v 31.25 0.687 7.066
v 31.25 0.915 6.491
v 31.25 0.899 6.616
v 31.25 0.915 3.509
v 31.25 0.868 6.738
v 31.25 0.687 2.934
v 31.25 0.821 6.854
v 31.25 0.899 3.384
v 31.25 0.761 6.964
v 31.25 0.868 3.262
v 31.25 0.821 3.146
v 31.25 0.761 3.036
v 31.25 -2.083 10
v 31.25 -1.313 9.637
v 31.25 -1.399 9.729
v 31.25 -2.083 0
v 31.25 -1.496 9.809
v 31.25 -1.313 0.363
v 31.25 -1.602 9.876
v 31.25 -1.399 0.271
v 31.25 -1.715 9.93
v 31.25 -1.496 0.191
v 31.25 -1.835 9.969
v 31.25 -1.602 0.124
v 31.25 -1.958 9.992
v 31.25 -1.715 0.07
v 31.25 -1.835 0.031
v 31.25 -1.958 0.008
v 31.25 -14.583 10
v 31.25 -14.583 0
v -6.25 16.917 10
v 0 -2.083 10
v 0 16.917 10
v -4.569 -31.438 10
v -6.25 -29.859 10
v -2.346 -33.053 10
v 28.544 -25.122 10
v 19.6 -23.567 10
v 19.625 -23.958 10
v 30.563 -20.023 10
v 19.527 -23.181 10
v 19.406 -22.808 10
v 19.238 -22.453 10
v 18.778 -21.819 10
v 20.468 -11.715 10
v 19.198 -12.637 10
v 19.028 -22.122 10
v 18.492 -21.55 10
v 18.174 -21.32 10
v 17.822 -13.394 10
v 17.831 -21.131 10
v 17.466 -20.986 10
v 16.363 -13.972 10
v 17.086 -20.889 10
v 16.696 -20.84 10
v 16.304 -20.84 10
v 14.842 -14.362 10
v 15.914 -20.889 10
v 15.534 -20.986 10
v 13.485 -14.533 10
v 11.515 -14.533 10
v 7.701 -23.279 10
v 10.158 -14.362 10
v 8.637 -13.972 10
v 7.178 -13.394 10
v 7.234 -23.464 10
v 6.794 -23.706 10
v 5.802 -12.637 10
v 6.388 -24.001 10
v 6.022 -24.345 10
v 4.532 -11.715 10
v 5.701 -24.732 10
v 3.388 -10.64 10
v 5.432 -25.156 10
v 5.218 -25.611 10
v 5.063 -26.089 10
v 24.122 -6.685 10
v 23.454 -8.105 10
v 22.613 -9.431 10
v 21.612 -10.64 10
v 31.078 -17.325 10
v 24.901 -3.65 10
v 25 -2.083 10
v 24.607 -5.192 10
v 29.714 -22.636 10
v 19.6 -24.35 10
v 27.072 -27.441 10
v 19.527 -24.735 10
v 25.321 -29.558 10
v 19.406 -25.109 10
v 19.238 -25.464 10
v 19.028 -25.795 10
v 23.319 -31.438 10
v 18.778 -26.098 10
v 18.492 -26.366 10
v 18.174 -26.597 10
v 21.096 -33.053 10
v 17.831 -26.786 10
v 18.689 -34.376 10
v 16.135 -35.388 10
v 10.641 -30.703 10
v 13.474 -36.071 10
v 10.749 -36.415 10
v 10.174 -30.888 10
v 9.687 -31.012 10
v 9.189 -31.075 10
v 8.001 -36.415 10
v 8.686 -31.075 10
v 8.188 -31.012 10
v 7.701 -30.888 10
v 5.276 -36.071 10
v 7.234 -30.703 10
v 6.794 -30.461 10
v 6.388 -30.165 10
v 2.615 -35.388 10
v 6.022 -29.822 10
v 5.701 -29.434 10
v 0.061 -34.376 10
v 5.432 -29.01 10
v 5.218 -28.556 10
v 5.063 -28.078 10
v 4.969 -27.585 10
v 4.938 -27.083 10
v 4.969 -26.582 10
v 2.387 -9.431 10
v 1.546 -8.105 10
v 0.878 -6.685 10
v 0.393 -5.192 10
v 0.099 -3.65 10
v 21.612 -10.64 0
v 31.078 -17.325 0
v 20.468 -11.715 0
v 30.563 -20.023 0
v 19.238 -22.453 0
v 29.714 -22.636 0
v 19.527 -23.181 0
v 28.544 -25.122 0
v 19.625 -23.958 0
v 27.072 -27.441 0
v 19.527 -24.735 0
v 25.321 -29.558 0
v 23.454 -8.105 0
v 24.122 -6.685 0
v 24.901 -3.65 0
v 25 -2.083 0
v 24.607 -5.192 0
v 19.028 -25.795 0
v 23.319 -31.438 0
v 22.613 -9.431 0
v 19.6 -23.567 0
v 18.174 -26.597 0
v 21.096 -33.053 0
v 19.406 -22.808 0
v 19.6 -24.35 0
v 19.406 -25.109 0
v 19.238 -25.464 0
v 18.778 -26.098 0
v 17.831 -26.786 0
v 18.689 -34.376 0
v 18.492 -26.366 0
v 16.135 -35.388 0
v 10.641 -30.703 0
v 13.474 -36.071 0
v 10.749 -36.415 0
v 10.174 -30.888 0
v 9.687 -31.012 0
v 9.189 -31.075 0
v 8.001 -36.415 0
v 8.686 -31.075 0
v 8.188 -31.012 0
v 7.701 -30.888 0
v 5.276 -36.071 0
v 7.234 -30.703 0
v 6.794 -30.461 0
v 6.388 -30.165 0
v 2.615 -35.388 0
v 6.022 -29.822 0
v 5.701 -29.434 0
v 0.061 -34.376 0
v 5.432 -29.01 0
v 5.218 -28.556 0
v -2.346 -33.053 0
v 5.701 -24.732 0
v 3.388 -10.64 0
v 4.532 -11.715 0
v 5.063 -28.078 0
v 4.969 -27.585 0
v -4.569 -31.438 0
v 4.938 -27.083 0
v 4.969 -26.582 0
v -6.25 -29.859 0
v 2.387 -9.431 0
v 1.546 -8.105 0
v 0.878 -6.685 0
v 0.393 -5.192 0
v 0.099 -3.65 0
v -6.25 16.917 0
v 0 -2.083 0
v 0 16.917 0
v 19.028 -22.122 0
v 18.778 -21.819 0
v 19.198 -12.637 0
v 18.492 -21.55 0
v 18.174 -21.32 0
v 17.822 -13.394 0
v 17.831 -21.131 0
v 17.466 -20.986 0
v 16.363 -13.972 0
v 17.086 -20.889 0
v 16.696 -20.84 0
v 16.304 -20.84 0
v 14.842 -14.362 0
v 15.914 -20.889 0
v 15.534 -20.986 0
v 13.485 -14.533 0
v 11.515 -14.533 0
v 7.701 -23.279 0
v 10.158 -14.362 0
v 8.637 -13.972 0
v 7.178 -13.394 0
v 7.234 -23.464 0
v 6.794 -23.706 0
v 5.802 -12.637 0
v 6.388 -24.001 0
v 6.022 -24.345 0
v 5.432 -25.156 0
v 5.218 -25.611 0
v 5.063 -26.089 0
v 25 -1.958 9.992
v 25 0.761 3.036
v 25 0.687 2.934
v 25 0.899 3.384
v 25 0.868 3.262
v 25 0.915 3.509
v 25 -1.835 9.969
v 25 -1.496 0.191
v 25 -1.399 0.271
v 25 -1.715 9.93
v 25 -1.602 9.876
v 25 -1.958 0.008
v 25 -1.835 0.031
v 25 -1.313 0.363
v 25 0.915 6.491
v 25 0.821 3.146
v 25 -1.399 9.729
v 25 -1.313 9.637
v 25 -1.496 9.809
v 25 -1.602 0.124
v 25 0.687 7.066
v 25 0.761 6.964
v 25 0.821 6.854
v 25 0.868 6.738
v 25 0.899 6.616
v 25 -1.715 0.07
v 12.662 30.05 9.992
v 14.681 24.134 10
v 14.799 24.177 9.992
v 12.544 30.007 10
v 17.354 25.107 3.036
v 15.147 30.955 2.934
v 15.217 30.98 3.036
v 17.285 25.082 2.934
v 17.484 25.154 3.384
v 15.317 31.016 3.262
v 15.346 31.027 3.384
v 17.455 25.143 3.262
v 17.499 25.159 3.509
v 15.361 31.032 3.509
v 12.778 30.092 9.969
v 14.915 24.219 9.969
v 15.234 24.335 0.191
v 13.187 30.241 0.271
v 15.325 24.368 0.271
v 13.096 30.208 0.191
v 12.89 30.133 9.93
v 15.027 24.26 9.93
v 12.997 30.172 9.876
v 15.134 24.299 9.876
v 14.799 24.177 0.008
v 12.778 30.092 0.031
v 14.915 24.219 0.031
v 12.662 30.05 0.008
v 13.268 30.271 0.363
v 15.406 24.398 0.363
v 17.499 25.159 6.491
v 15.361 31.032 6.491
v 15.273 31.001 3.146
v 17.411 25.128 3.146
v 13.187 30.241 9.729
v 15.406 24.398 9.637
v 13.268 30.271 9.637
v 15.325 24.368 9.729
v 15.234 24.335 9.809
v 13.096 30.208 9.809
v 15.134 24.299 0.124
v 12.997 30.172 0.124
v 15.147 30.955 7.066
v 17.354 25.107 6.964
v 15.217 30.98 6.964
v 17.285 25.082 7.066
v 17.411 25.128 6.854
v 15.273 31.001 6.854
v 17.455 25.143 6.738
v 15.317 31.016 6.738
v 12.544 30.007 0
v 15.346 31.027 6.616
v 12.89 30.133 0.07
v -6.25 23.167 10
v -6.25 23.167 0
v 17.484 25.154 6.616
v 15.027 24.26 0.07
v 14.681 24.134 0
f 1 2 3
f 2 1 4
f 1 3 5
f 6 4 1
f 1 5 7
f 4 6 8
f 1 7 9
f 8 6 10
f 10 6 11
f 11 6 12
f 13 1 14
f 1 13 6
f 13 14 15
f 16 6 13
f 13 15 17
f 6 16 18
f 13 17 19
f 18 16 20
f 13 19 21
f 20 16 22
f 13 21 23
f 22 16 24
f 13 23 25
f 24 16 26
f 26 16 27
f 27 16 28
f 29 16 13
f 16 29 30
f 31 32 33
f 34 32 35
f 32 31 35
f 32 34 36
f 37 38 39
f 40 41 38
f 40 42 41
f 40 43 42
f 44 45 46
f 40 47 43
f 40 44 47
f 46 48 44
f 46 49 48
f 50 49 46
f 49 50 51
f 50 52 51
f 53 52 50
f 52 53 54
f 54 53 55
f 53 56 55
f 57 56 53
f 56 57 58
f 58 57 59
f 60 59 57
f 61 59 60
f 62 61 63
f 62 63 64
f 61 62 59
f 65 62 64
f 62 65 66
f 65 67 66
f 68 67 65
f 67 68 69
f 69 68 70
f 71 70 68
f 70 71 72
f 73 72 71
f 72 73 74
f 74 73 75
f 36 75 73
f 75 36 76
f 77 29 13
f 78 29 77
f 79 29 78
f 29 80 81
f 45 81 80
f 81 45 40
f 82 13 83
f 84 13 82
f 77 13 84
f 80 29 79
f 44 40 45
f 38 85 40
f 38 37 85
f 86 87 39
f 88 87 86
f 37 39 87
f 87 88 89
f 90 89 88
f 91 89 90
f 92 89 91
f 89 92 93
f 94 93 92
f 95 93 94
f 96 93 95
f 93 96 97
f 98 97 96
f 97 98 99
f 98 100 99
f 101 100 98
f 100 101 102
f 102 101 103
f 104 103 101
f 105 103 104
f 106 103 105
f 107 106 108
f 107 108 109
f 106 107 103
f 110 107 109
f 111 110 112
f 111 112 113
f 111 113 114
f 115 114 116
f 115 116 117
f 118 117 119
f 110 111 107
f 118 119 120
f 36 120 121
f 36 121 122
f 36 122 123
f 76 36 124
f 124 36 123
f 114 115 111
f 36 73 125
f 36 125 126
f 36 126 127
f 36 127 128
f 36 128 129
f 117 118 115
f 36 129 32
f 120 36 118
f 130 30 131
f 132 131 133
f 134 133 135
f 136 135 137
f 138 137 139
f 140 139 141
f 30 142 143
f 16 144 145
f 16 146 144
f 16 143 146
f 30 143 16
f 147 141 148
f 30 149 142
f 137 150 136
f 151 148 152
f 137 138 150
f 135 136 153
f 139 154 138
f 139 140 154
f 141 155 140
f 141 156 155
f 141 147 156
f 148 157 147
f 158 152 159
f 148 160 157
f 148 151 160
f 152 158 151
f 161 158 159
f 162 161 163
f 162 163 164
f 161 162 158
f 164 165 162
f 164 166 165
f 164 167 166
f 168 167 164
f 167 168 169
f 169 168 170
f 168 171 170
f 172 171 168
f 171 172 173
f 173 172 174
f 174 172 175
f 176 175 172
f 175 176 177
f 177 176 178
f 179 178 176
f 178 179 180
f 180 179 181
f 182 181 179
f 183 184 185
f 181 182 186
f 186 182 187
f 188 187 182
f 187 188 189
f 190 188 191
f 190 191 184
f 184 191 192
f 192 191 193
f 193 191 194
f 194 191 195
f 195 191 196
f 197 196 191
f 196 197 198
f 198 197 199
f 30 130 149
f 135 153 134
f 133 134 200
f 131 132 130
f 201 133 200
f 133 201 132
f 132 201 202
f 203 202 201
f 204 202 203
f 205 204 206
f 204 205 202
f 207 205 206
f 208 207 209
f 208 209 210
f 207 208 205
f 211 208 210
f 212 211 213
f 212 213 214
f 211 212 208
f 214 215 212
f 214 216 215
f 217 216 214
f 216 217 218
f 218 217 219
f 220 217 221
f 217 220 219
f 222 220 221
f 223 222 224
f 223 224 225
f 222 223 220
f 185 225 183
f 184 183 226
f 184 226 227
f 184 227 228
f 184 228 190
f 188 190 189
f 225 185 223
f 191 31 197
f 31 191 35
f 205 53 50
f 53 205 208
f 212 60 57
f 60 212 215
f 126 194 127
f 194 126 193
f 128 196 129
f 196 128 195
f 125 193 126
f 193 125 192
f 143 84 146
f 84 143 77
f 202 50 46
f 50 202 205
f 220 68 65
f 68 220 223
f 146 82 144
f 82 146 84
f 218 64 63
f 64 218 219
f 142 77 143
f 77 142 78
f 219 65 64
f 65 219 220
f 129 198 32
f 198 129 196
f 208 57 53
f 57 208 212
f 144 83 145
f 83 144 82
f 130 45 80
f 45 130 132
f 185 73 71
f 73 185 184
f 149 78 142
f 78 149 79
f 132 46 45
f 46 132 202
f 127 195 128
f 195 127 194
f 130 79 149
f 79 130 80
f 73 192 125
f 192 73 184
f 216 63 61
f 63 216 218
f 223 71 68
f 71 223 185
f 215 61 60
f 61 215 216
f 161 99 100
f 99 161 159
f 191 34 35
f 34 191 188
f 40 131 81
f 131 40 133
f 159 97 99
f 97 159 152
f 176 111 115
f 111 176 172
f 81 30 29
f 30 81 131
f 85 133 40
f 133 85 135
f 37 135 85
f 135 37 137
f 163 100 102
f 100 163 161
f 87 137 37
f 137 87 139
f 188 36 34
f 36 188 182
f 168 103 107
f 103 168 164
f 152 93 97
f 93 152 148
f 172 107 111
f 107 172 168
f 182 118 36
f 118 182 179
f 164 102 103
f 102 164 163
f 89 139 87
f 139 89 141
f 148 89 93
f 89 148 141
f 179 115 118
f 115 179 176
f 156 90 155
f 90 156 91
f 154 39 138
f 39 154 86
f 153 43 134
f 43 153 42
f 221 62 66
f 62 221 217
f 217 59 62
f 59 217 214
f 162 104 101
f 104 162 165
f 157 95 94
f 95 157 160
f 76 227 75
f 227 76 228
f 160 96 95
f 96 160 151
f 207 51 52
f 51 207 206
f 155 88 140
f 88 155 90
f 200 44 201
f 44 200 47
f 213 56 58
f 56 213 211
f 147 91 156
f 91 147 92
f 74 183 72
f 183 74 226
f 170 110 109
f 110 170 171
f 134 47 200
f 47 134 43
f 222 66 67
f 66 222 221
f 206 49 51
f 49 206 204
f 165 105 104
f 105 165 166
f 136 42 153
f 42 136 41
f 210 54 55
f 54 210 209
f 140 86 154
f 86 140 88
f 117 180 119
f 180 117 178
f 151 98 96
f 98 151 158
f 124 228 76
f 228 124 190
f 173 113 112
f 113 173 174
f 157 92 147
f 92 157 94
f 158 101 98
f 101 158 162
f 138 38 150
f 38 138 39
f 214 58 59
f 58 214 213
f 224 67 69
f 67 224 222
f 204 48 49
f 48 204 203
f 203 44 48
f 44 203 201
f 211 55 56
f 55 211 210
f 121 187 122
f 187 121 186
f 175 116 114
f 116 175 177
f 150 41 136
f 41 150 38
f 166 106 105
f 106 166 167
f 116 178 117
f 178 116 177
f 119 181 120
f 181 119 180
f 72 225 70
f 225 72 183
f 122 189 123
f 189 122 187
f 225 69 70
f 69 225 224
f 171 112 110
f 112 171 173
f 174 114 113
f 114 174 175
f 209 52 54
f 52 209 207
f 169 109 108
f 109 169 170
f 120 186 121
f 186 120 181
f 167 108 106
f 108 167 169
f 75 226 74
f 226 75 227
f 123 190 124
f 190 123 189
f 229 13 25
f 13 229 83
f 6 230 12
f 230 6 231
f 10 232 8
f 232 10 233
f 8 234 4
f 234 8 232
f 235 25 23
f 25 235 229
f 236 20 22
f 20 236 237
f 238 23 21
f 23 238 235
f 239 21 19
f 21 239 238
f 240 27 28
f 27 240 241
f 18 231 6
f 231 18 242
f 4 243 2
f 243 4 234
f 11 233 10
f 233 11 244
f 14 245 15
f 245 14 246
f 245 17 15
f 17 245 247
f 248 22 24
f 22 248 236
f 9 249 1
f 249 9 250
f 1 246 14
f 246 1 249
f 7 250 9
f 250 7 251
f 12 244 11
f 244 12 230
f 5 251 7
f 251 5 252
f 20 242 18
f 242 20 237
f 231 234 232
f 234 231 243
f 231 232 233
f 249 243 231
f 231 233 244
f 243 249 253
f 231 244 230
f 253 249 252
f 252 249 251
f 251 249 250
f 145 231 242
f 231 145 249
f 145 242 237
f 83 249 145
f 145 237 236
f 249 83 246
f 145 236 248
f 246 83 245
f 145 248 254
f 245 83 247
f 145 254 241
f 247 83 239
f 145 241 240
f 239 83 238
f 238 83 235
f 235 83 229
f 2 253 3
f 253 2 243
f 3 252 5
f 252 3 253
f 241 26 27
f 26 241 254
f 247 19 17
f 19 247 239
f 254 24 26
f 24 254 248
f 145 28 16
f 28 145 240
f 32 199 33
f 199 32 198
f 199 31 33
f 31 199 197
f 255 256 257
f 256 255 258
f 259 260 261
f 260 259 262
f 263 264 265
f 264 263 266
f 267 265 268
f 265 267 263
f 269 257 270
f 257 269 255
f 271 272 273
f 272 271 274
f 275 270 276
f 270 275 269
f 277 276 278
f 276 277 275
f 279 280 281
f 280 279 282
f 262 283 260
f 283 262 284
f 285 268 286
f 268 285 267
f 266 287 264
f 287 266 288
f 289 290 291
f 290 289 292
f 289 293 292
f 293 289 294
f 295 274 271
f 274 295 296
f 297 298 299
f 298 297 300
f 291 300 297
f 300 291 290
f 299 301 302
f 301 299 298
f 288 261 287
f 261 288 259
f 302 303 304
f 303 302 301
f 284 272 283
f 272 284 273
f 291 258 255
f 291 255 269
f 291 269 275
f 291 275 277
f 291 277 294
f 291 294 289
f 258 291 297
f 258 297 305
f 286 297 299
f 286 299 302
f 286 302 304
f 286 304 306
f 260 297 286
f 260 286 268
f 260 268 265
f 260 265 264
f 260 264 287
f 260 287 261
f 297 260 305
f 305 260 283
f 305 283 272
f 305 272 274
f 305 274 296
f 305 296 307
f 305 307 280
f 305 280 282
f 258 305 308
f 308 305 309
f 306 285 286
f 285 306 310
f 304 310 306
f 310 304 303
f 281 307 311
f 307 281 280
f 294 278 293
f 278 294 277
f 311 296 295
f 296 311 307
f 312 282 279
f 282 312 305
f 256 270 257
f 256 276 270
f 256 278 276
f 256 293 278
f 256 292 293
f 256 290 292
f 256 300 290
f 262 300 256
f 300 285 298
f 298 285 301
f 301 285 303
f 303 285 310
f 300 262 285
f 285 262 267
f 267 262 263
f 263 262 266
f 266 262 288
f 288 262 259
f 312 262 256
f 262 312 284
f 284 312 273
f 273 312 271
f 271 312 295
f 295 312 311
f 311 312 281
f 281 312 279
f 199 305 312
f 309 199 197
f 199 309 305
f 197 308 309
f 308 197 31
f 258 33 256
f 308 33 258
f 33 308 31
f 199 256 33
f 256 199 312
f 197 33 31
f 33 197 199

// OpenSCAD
/*----------------------------------------------------------------------------*/
/*-------                         INFORMATIONS                        --------*/
/*----------------------------------------------------------------------------*/
/*----------------------------------------------------------------------------*/

// CUSTOMIZABLE U-HOOK (parametric and very strong hook)
// by Serge Payen, January 2016
// www.sergepayen.fr/en/parametric-u-hook
// "customizable_u_hook" is licenced under Creative Commons :
// Attribution-NonCommercial-ShareAlike 4.0 International (CC BY-NC-SA 4.0)
// http://creativecommons.org/licenses/by-nc-sa/4.0/

// HOW TO USE THIS FILE :

// -- Solution 1 :
// Open this file with OpenScad software (free and open-source)
// http://www.openscad.org/downloads.html
// Choose your parameters in the SETTINGS chapter (see below)
// Press F5 to compile and see the resulting hook
// Check your hook's global size in the console window (below viewing area)
// If OK, press F6 to render
// Go to : File => Export => Export as STL : choose filename and location
// Save the STL file of your customized hook
// Send this STL file to your 3D printer

// -- Solution 2 :
// This file had been optimized for Thingiverse Customizer
// You will need to have a Thingiverse Account, then :
// Go to object's page on Thingiverse
// Click on the button "Open in Customizer"
// Choose your settings in parameters tabs
// Save the STL file of your customized hook
// Send this STL file to your 3D printer



/*----------------------------------------------------------------------------*/
/*-------                           SETTINGS                          --------*/
/*----------------------------------------------------------------------------*/

/* [HOOK SHAPE] */

// Choose between classic hook with screw-holes (0) or "bracket" system (1)
bracket=0; // [0, 1]

// Choose between square (0) and round bracket (1)
bracket_round=0; // [0, 1]

// Choose to have a second hook (1) or not (0)
second_hook=1; // [0, 1]



/* [MAIN HOOK SIZE] */

// Intern diameter of hook's main U shape
hook_size=25; // [0.1:250]

// Hook's "thickness" = object's width = print's height
thickness=10; // [0.1:250]



/* [SECOND HOOK] */

// Lenght of second hook. Good values are around "Hook Size" x 0.75
second_hook_lenght=20; // [0.1:200]

// Angle of second hook. Best is between 45° and 65°.
second_hook_angle=70; // [0:90]



/* [SPACERS] */

// Space between main hook and bottom screw
spacer_1=0; // [0:200]

// Space between bottom screw and secondary hook
spacer_2=10; // [0:200]

// Space between second hook and top screw
spacer_3=0; // [0:200]

// Space between top screw and hook's rounded top
spacer_4=0; // [0:200]



/* [SCREW-HOLES] */

// Diameter of the screw you plan to use
screw_diam=3; // [0:0.5:20]

// Diameter of screw-head
screw_head=8; // [0:0.5:40]

// Screw-head height (deepness for screw-head hole)
screw_head_h=3; // [0:0.5:20]

// Tolerance, for screw easy-fitting
tolerance=0.5; // [0:0.1:10]



/* [BRACKET] */

// Bracket's main size
bracket_size=40; // [0:250]

// Bracket's back lenght
stop_lenght=15; // [0:250]

// Bracket Stiffness (only with square bracket)
bracket_stiffness=2.5; // [0:100]



/* [EXTRA SETTINGS] */

// Choose to have a screw-hole in square bracket (1), or not (0)
safety_screw=0; // [1, 0]

// Choose to have the hook's "triangle" extremity (1) or not (0)
extremity=1; // [1, 0]

// Choose to have screw-holes (1) or not (0)
screw_holes=0; // [1, 0]

// Choose to have the hook's rounded "top" (1) or not (0)
rounded_top=1; // [1, 0]



/*------------------------------------------------------------------------------

NOTE about GENERAL DIMENSIONS AND CUSTOM HEIGHTS SETTINGS :

To respect general shape's efficiency, global size is relative to "hook_size".
Change "hook_size" for a bigger or smaller hook, then choose more options.
Different values for "spacer_1,2,3,4" will change size on Y-axis.

When compiling, OpenScad will return the total dimensions in the console window.
Keep in mind the hook is printed "laying on his side" on print bed.
In the first few lines of console window (below viewing area), you can read :
ECHO : TOTAL_SIZE_ON_X_AXIS = x (total width : adjust "hook_size" and/or bracket)
ECHO : TOTAL_SIZE_ON_Y_AXIS = y (total lenght : adjust with "spacer_1/2/3/4")
ECHO : TOTAL_SIZE_ON_Z_AXIS = z (total height : adjust "thickness")
It will also return informations about all other strategic sizes.
Console will also display warning messages if some values are illogic.

------------------------------------------------------------------------------*/



/*----------------------------------------------------------------------------*/
/*-------                             CODE                            --------*/
/*----------------------------------------------------------------------------*/

/*____________________________________________________________________________*/
/* [HIDDEN] */
// shortcuts
stiffness=hook_size/4;
big_r=hook_size/5*0.8;
small_r=stiffness/2;
height_bottom=hook_size;
width_global=hook_size+stiffness*2;
half_width=width_global/2-stiffness/2;
screw_hole=screw_diam+tolerance*2;
screw_house=screw_head+tolerance*2;
bracket_move=bracket_size/2+width_global/2;
bracket_round_diam=bracket_size+stiffness*2;
min_height1=spacer_1+screw_house/2+stiffness;
min_height2=min_height1+spacer_2/2+screw_house/2;
min_height2_hg=spacer_1+stiffness+spacer_2/2;
min_height3=min_height2+spacer_3/2+spacer_2/2;
min_height3_hg=min_height2_hg+spacer_3/2+spacer_2/2;
min_height4=min_height3+spacer_4/2+spacer_3/2+screw_house;
min_height4_hg=min_height3_hg+spacer_3/2+spacer_4/2;
space_global=spacer_1+spacer_2+spacer_3+spacer_4;
$fn=50;

// remove specific colors for each module
color ("Gold")
translate ([hook_size/2,-hook_size/3,thickness/2])
rotate ([0,0,0])
uhook ();

echo (TOTAL_SIZE_ON_Z_AXIS=thickness);
echo (MAIN_HOOK_INTERN_DIAMETER=hook_size);

if (bracket)
{
    echo (BRACKET_SIZE=bracket_size);
    echo (BRACKET_STIFFNESS=bracket_stiffness);
    echo (STOP_LENGHT=stop_lenght);
}
else
{
    echo (SCREW_HOLES_DIAMETER=screw_diam);
    echo (SCREW_HEAD_DIAMETER=screw_head);
    echo (SCREW_HEAD_HEIGHT=screw_head_h);
}

if ((bracket)&&(safety_screw))
{
    echo (SAFETY_SCREW_DIAMETER=screw_diam);
    echo (SAFETY_SCREW_HEAD_DIAMETER=screw_head);
    echo (SAFETY_SCREW_HEAD_HEIGHT=screw_head_h);
}

if (second_hook)
{
    echo (SECOND_HOOK_LENGHT=second_hook_lenght);
    echo (SECOND_HOOK_ANGLE=second_hook_angle);
}






/*____________________________________________________________________________*/
// final union of all modules
module uhook ()
{
    union ()
    {

        // hook's base, this part don't depend on hook's type
        belly ();

        translate ([0,-height_bottom/2-stiffness,0])
        bottom ();

        translate ([half_width,stiffness,0])
        rotate ([0,90,0])
        tip ();



        // conditionnal part, depending on hook's type
        if (bracket)
        {
            translate ([-half_width,stiffness+spacer_1/2,0])
            addH1 ();
            translate ([-half_width,min_height2_hg,0])
            addH2 ();
        }
        else
        {
            translate ([-half_width,stiffness+spacer_1/2,0])
            addH1 ();
            translate ([-half_width,min_height1,0])
            screw ();
            translate ([-half_width,min_height2,0])
            addH2 ();
        }

        if ((bracket)&&(second_hook))
        {
            translate ([-width_global/2,min_height2_hg+spacer_2/2,-thickness/2])
            arm ();
            translate ([-half_width,min_height3_hg+hook_size,0])
            addH3 ();
            translate ([-half_width,min_height4_hg+hook_size,0])
            addH4 ();
            if (bracket_round)
            {
            translate ([-width_global/2-bracket_round_diam/2+stiffness,min_height4_hg+hook_size+spacer_4/2,0])
            sHook ();
            //width calculation
            width_total=width_global-stiffness+bracket_round_diam;
            echo (TOTAL_SIZE_ON_X_AXIS=width_total);
            //height calculation
            height_global=hook_size*2+stiffness*2+space_global+bracket_round_diam/2;
            echo (TOTAL_SIZE_ON_Y_AXIS=height_global);
            }
            else
            {
                translate ([-half_width,min_height4_hg+hook_size+spacer_4/2+stiffness/2,0])
                head ();
                translate ([-bracket_move,min_height4_hg+hook_size+spacer_4/2+stiffness-bracket_stiffness/2,0])
                hang ();
                //width calculation
                width_total=width_global+bracket_size+bracket_stiffness;
                echo (TOTAL_SIZE_ON_X_AXIS=width_total);
                //height calculation
                height_global=hook_size*2+stiffness*3+space_global;
                echo (TOTAL_SIZE_ON_Y_AXIS=height_global);
            }

        }

        else if (second_hook)
        {
            translate ([-width_global/2,min_height2+spacer_2/2,-thickness/2])
            arm ();
            // translate ([-half_width,min_height3+hook_size,0])
            // addH3 ();
            // translate ([-half_width,min_height3+hook_size+spacer_3/2+screw_house/2,0])
            // screw ();
            // translate ([-half_width,min_height4+hook_size,0])
            // addH4 ();
            // translate ([-half_width,min_height4+hook_size+spacer_4/2+stiffness/2,0])
            // head ();
            //height calculation
            height_global=hook_size*2+stiffness*3+screw_house*2+space_global;
            echo (TOTAL_SIZE_ON_Y_AXIS=height_global);
        }
        else if (bracket)
        {
            translate ([-half_width,min_height3_hg,0])
            addH3 ();
            translate ([-half_width,min_height4_hg,0])
            addH4 ();
            if (bracket_round)
            {
                translate ([-width_global/2-bracket_round_diam/2+stiffness,min_height4_hg+spacer_4/2,0])
                sHook ();
                //width calculation
                width_total=width_global-stiffness+bracket_round_diam;
                echo (TOTAL_SIZE_ON_X_AXIS=width_total);
                //height calculation
                height_global=hook_size+stiffness*2+space_global+bracket_round_diam/2;
                echo (TOTAL_SIZE_ON_Y_AXIS=height_global);
            }
            else
            {
                translate ([-half_width,min_height4_hg+spacer_4/2+stiffness/2,0])
                head ();
                translate ([-bracket_move,min_height4_hg+spacer_4/2+stiffness-bracket_stiffness/2,0])
                hang ();
                //width calculation
                width_total=width_global+bracket_size+bracket_stiffness;
                echo (TOTAL_SIZE_ON_X_AXIS=width_total);
                //height calculation
                height_global=hook_size+stiffness*3+space_global;
                echo (TOTAL_SIZE_ON_Y_AXIS=height_global);
            }

        }
        else
        {
            translate ([-half_width,min_height3,0])
            addH3 ();
            translate ([-half_width,min_height3+spacer_3/2+screw_house/2,0])
            screw ();
            translate ([-half_width,min_height4,0])
            addH4 ();
            translate ([-half_width,min_height4+spacer_4/2+stiffness/2,0])
            head ();
            //height calculation
            height_global=hook_size+stiffness*3+screw_house*2+space_global;
            echo (TOTAL_SIZE_ON_Y_AXIS=height_global);
        }

    }

}



/*____________________________________________________________________________*/
// hook's bottom shape, with a hole inside
module bottom ()
{
    color ("Gold")
    difference ()
    {
        // bottom
        intersection ()
        {
            cube ([width_global,height_bottom+0.1,thickness], center=true);

            translate ([-0.5*stiffness,height_bottom/2,0])
            cylinder(r=hook_size/2+stiffness*1.5, h=thickness+0.1, center=true);

        }

        // hole
        hull ()
        {
            translate ([-big_r/2-stiffness/4,0,0])
            cylinder (r=big_r, h=thickness+0.2, center=true);

            translate ([big_r,stiffness/2,0])
            cylinder (r=small_r, h=thickness+0.2, center=true);

        }

    }

}


/*____________________________________________________________________________*/
// main hook's U-shape
module belly ()
{
    color ("Crimson")
    difference ()
    {
        // base cube
        cube ([width_global,hook_size/2,thickness], center=true);

        // half-cylindric hole
        translate ([0,hook_size/4,0])
        cylinder (r=hook_size/2, h=thickness+0.1, center=true);

    }
}


/*____________________________________________________________________________*/
// screw-hole module
module screw ()
{
    if (thickness>screw_house*8)
    {
        color ("Silver")
        difference ()
        {
            //base cube
            cube ([stiffness,screw_house,thickness], center=true);

            if (screw_holes)
            {
                // screw1 hole
                translate ([0,0,thickness/4])
                rotate ([0,90,0])
                cylinder (d=screw_hole, h=stiffness+0.1, center=true);

                // screw1-head hole 1
                translate ([stiffness/2-screw_head_h/2+0.1,0,thickness/4])
                rotate ([0,90,0])
                cylinder (d=screw_house, h=screw_head_h, center=true);

                // screw2 hole
                translate ([0,0,-thickness/4])
                rotate ([0,90,0])
                cylinder (d=screw_hole, h=stiffness+0.1, center=true);

                // screw2-head hole 1
                translate ([stiffness/2-screw_head_h/2+0.1,0,-thickness/4])
                rotate ([0,90,0])
                cylinder (d=screw_house, h=screw_head_h, center=true);
            }
        }

    }
    else
    {
        color ("Silver")
        difference ()
        {
            //base cube
            cube ([stiffness,screw_house,thickness], center=true);

            if (screw_holes)
            {
                // screw hole
                rotate ([0,90,0])
                cylinder (d=screw_hole, h=stiffness+0.1, center=true);

                // screw-head hole
                translate ([stiffness/2-screw_head_h/2+0.1,0,0])
                rotate ([0,90,0])
                cylinder (d=screw_house, h=screw_head_h, center=true);
            }

        }
    }

}


/*____________________________________________________________________________*/
// hook's triangle extremity
module tip ()
{
    if (extremity)
    color ("Gold")
    difference ()
    {
        hull ()
        {
            translate ([thickness/2-thickness/10,0,0])
            cylinder (d=thickness/5, h=stiffness, center=true);
            translate ([-thickness/2+thickness/10,0,0])
            cylinder (d=thickness/5, h=stiffness, center=true);

            translate ([thickness/7,thickness/5,0])
            cylinder (d=thickness/5, h=stiffness, center=true);
            translate ([-thickness/7,thickness/5,0])
            cylinder (d=thickness/5, h=stiffness, center=true);
        }

        translate ([0,-thickness/4,0])
        cube ([thickness+0.1, thickness/2, thickness], center=true);

    }
    else
    {
        hull ()
        {
            translate ([thickness/2-thickness/10,0,0])
            cylinder (d=thickness/5, h=stiffness, center=true);
            translate ([-thickness/2+thickness/10,0,0])
            cylinder (d=thickness/5, h=stiffness, center=true);
        }
    }

}


/*____________________________________________________________________________*/
// secondary hook
module arm ()
{
    color ("Orange")
    union ()
    {
        // cube ([stiffness, hook_size, thickness]);

        translate ([0,stiffness,0])
        union ()
        {
            rotate ([0,0,-second_hook_angle])
            union ()
            {
                hull ()
                {
                    cube ([stiffness, second_hook_lenght, thickness]);
                    rotate ([0,0,second_hook_angle])
                    translate ([0,-stiffness,0])
                    cube ([stiffness, stiffness, thickness]);
                }

                rotate ([0,90,0])
                translate ([-thickness/2,second_hook_lenght,stiffness/2])
                tip ();
            }
        }
    }

}


/*____________________________________________________________________________*/
// hook's rounded top
module head ()
{
    color ("Gold")
    intersection ()
    {
        cube ([stiffness,stiffness,thickness], center=true);
        if (rounded_top)
        translate ([-stiffness/2,-stiffness/2,0])
        cylinder (r=stiffness, h=thickness+0.2, center=true);
    }

}


/*____________________________________________________________________________*/
// Square bracket, rectangular part to clip on a door's top
module hang ()
{
    union ()
    {
        //bracket part 1, on one side of safety screw
        color ("Crimson")
        translate ([bracket_size/4+screw_house/4,0,0])
        cube ([bracket_size/2-screw_house/2,bracket_stiffness,thickness], center=true);

        //safety screw
        if (safety_screw)
        {
            color ("Silver")
            difference ()
            {
                cube ([screw_house,bracket_stiffness,thickness],center=true);
                rotate ([90,0,0])
                cylinder (d=screw_hole, h=bracket_stiffness+0.1, center=true);
                translate ([0,bracket_stiffness/2-screw_head_h/2,0])
                rotate ([90,0,0])
                cylinder (d=screw_house, h=screw_head_h+0.1, center=true);
            }

            //bracket part 2, on the other side of safety screw
            color ("Crimson")
            translate ([-bracket_size/4-screw_house/4,0,0])
            cube ([bracket_size/2-screw_house/2,bracket_stiffness,thickness], center=true);

            //stop
            color ("Orange")
            translate ([-bracket_size/2-bracket_stiffness/2,0,0])

            union ()
            {
                // rounding part between bracket top part and stop
                intersection ()
                {
                    cube ([bracket_stiffness,bracket_stiffness,thickness],center=true);
                    translate ([bracket_stiffness/2,-bracket_stiffness/2,0])
                    cylinder (r=bracket_stiffness, h=thickness, center=true);
                }

                difference ()
                {
                    // stop main cube
                    color ("DeepSkyBlue")
                    translate ([0,-stop_lenght/2-bracket_stiffness/2,0])
                    cube ([bracket_stiffness,stop_lenght,thickness], center=true);

                    // rounding stop's bottom extremity
                    if (stop_lenght>=bracket_stiffness)
                    translate ([0,-stop_lenght,0])
                    difference ()
                    {
                        cube ([bracket_stiffness+0.1,bracket_stiffness+0.1,thickness+0.1],center=true);
                        translate ([bracket_stiffness/2,bracket_stiffness/2,0])
                        cylinder (r=bracket_stiffness, h=thickness+0.2, center=true);
                    }
                }

            }

        }

        else
        {
            union ()
            {
                //bracket main size (top part)
                color ("Crimson")
                cube ([bracket_size,bracket_stiffness,thickness],center=true);

                // rounding part between bracket top part and stop
                translate ([-bracket_size/2-bracket_stiffness/2,0,0])
                intersection ()
                {
                    cube ([bracket_stiffness,bracket_stiffness,thickness],center=true);
                    translate ([bracket_stiffness/2,-bracket_stiffness/2,0])
                    cylinder (r=bracket_stiffness, h=thickness, center=true);
                }

                difference ()
                {
                    color ("DeepSkyBlue")
                    // stop main cube
                    translate ([-bracket_size/2-bracket_stiffness/2,-stop_lenght/2-bracket_stiffness/2,0])
                    cube ([bracket_stiffness,stop_lenght,thickness], center=true);

                    // rounding stop's bottom extremity
                    if (stop_lenght>=bracket_stiffness)
                    translate ([-bracket_size/2-bracket_stiffness/2,-stop_lenght,0])
                    difference ()
                    {
                        cube ([bracket_stiffness+0.1,bracket_stiffness+0.1,thickness+0.1],center=true);
                        translate ([bracket_stiffness/2,bracket_stiffness/2,0])
                        cylinder (r=bracket_stiffness, h=thickness+0.2, center=true);
                    }
                }

            }
        }

    }
}


/*____________________________________________________________________________*/
// Rounded bracket, to clip hook on a tube
module sHook ()
union ()
{
    // difference to erase bottom half
    difference ()
    {
        // difference between extern and intern diameters
        color ("Crimson")
        difference ()
        {
            cylinder (d=bracket_round_diam, h=thickness, center=true);
            cylinder (d=bracket_size,h=thickness+0.1, center=true);
        }

        //cube to erase bottom half
        translate ([0,-bracket_round_diam/4,0])
        cube ([bracket_round_diam+0.1,bracket_round_diam/2,thickness+0.1], center=true);
    }

    // rounded extremity
    color ("DeepSkyBlue")
    hull ()
    {
        translate ([-bracket_round_diam/2+stiffness/2,0,0])
        cylinder (d=stiffness, h=thickness, center=true);
        translate ([-bracket_round_diam/2+stiffness/2,-stop_lenght+stiffness/2,0])
        cylinder (d=stiffness, h=thickness, center=true);
    }

}



/*____________________________________________________________________________*/
// spacer_1 : custom height above main hook, below bottom screw
module addH1 ()
{
    color ("Cyan")
    cube ([stiffness,spacer_1,thickness], center=true);
}


/*____________________________________________________________________________*/
// spacer_2 : custom height above bottom screw, below secondary hook
module addH2 ()
{
    color ("DeepSkyBlue")
    cube ([stiffness,spacer_2,thickness], center=true);
}


/*____________________________________________________________________________*/
// spacer_3 : custom height above secondary hook, below top screw
module addH3 ()
{
    color ("DodgerBlue")
    cube ([stiffness,spacer_3,thickness], center=true);
}


/*____________________________________________________________________________*/
// spacer_4 : custom height above top screw, below rounded top
module addH4 ()
{
    color ("DarkBlue")
    cube ([stiffness,spacer_4,thickness], center=true);
}


/*____________________________________________________________________________*/
/*____________________________________________________________________________*/
/*____________________________________________________________________________*/
// Warning messages

if ((bracket)&&(safety_screw)&&(bracket_round!=true))
{
    if (thickness<screw_house*2)
    echo (" WARNING : Safety Screw Hole seems too big compare to Thickness ");
    if (screw_head_h>bracket_stiffness)
    echo (" WARNING : Safety Screw Head Height seems too big compare to Bracket Stiffness ");
    if (screw_head<=screw_diam)
    echo (" WARNING : Screw Head Diameter should be bigger than Screw Diameter ");
    if (bracket_size<=screw_house)
    echo (" WARNING : Bracket Size seems too small compare to Screw Holes ");
    if (stop_lenght<bracket_stiffness)
    echo (" WARNING : Stop Lenght should be bigger than Bracket Stiffness ");
}

if (bracket!=true)
{
    if (thickness<screw_house*2)
    echo (" WARNING : Screw Holes seems too big compare to Thickness ");
    if (screw_head<=screw_diam)
    echo (" WARNING : Screw Head Diameter should be bigger than Screw Diameter ");
    if (screw_head_h>stiffness/2)
    echo (" WARNING : Screw Head Height seems too big compare to Hook Size");
}

if ((bracket!=true)&&(second_hook!=true))
{
    if (spacer_2+spacer_3<screw_house)
    echo (" WARNING : Screws seems too close. Push up value of Spacer 2 or 3 ");
}

if (second_hook)
{
    if (second_hook_lenght>hook_size)
    echo (" WARNING : Second Hook Lenght should be smaller than Hook Size ");
    if (second_hook_lenght<hook_size/3)
    echo (" WARNING : Second Hook Lenght seems very small compare to Hook Size ");
    if (second_hook_angle<45)
    echo (" WARNING : Best values for Second Hook Angle are between 45° and 65° ");
    if (second_hook_angle>65)
    echo (" WARNING : Best values for Second Hook Angle are between 45° and 65° ");
}
